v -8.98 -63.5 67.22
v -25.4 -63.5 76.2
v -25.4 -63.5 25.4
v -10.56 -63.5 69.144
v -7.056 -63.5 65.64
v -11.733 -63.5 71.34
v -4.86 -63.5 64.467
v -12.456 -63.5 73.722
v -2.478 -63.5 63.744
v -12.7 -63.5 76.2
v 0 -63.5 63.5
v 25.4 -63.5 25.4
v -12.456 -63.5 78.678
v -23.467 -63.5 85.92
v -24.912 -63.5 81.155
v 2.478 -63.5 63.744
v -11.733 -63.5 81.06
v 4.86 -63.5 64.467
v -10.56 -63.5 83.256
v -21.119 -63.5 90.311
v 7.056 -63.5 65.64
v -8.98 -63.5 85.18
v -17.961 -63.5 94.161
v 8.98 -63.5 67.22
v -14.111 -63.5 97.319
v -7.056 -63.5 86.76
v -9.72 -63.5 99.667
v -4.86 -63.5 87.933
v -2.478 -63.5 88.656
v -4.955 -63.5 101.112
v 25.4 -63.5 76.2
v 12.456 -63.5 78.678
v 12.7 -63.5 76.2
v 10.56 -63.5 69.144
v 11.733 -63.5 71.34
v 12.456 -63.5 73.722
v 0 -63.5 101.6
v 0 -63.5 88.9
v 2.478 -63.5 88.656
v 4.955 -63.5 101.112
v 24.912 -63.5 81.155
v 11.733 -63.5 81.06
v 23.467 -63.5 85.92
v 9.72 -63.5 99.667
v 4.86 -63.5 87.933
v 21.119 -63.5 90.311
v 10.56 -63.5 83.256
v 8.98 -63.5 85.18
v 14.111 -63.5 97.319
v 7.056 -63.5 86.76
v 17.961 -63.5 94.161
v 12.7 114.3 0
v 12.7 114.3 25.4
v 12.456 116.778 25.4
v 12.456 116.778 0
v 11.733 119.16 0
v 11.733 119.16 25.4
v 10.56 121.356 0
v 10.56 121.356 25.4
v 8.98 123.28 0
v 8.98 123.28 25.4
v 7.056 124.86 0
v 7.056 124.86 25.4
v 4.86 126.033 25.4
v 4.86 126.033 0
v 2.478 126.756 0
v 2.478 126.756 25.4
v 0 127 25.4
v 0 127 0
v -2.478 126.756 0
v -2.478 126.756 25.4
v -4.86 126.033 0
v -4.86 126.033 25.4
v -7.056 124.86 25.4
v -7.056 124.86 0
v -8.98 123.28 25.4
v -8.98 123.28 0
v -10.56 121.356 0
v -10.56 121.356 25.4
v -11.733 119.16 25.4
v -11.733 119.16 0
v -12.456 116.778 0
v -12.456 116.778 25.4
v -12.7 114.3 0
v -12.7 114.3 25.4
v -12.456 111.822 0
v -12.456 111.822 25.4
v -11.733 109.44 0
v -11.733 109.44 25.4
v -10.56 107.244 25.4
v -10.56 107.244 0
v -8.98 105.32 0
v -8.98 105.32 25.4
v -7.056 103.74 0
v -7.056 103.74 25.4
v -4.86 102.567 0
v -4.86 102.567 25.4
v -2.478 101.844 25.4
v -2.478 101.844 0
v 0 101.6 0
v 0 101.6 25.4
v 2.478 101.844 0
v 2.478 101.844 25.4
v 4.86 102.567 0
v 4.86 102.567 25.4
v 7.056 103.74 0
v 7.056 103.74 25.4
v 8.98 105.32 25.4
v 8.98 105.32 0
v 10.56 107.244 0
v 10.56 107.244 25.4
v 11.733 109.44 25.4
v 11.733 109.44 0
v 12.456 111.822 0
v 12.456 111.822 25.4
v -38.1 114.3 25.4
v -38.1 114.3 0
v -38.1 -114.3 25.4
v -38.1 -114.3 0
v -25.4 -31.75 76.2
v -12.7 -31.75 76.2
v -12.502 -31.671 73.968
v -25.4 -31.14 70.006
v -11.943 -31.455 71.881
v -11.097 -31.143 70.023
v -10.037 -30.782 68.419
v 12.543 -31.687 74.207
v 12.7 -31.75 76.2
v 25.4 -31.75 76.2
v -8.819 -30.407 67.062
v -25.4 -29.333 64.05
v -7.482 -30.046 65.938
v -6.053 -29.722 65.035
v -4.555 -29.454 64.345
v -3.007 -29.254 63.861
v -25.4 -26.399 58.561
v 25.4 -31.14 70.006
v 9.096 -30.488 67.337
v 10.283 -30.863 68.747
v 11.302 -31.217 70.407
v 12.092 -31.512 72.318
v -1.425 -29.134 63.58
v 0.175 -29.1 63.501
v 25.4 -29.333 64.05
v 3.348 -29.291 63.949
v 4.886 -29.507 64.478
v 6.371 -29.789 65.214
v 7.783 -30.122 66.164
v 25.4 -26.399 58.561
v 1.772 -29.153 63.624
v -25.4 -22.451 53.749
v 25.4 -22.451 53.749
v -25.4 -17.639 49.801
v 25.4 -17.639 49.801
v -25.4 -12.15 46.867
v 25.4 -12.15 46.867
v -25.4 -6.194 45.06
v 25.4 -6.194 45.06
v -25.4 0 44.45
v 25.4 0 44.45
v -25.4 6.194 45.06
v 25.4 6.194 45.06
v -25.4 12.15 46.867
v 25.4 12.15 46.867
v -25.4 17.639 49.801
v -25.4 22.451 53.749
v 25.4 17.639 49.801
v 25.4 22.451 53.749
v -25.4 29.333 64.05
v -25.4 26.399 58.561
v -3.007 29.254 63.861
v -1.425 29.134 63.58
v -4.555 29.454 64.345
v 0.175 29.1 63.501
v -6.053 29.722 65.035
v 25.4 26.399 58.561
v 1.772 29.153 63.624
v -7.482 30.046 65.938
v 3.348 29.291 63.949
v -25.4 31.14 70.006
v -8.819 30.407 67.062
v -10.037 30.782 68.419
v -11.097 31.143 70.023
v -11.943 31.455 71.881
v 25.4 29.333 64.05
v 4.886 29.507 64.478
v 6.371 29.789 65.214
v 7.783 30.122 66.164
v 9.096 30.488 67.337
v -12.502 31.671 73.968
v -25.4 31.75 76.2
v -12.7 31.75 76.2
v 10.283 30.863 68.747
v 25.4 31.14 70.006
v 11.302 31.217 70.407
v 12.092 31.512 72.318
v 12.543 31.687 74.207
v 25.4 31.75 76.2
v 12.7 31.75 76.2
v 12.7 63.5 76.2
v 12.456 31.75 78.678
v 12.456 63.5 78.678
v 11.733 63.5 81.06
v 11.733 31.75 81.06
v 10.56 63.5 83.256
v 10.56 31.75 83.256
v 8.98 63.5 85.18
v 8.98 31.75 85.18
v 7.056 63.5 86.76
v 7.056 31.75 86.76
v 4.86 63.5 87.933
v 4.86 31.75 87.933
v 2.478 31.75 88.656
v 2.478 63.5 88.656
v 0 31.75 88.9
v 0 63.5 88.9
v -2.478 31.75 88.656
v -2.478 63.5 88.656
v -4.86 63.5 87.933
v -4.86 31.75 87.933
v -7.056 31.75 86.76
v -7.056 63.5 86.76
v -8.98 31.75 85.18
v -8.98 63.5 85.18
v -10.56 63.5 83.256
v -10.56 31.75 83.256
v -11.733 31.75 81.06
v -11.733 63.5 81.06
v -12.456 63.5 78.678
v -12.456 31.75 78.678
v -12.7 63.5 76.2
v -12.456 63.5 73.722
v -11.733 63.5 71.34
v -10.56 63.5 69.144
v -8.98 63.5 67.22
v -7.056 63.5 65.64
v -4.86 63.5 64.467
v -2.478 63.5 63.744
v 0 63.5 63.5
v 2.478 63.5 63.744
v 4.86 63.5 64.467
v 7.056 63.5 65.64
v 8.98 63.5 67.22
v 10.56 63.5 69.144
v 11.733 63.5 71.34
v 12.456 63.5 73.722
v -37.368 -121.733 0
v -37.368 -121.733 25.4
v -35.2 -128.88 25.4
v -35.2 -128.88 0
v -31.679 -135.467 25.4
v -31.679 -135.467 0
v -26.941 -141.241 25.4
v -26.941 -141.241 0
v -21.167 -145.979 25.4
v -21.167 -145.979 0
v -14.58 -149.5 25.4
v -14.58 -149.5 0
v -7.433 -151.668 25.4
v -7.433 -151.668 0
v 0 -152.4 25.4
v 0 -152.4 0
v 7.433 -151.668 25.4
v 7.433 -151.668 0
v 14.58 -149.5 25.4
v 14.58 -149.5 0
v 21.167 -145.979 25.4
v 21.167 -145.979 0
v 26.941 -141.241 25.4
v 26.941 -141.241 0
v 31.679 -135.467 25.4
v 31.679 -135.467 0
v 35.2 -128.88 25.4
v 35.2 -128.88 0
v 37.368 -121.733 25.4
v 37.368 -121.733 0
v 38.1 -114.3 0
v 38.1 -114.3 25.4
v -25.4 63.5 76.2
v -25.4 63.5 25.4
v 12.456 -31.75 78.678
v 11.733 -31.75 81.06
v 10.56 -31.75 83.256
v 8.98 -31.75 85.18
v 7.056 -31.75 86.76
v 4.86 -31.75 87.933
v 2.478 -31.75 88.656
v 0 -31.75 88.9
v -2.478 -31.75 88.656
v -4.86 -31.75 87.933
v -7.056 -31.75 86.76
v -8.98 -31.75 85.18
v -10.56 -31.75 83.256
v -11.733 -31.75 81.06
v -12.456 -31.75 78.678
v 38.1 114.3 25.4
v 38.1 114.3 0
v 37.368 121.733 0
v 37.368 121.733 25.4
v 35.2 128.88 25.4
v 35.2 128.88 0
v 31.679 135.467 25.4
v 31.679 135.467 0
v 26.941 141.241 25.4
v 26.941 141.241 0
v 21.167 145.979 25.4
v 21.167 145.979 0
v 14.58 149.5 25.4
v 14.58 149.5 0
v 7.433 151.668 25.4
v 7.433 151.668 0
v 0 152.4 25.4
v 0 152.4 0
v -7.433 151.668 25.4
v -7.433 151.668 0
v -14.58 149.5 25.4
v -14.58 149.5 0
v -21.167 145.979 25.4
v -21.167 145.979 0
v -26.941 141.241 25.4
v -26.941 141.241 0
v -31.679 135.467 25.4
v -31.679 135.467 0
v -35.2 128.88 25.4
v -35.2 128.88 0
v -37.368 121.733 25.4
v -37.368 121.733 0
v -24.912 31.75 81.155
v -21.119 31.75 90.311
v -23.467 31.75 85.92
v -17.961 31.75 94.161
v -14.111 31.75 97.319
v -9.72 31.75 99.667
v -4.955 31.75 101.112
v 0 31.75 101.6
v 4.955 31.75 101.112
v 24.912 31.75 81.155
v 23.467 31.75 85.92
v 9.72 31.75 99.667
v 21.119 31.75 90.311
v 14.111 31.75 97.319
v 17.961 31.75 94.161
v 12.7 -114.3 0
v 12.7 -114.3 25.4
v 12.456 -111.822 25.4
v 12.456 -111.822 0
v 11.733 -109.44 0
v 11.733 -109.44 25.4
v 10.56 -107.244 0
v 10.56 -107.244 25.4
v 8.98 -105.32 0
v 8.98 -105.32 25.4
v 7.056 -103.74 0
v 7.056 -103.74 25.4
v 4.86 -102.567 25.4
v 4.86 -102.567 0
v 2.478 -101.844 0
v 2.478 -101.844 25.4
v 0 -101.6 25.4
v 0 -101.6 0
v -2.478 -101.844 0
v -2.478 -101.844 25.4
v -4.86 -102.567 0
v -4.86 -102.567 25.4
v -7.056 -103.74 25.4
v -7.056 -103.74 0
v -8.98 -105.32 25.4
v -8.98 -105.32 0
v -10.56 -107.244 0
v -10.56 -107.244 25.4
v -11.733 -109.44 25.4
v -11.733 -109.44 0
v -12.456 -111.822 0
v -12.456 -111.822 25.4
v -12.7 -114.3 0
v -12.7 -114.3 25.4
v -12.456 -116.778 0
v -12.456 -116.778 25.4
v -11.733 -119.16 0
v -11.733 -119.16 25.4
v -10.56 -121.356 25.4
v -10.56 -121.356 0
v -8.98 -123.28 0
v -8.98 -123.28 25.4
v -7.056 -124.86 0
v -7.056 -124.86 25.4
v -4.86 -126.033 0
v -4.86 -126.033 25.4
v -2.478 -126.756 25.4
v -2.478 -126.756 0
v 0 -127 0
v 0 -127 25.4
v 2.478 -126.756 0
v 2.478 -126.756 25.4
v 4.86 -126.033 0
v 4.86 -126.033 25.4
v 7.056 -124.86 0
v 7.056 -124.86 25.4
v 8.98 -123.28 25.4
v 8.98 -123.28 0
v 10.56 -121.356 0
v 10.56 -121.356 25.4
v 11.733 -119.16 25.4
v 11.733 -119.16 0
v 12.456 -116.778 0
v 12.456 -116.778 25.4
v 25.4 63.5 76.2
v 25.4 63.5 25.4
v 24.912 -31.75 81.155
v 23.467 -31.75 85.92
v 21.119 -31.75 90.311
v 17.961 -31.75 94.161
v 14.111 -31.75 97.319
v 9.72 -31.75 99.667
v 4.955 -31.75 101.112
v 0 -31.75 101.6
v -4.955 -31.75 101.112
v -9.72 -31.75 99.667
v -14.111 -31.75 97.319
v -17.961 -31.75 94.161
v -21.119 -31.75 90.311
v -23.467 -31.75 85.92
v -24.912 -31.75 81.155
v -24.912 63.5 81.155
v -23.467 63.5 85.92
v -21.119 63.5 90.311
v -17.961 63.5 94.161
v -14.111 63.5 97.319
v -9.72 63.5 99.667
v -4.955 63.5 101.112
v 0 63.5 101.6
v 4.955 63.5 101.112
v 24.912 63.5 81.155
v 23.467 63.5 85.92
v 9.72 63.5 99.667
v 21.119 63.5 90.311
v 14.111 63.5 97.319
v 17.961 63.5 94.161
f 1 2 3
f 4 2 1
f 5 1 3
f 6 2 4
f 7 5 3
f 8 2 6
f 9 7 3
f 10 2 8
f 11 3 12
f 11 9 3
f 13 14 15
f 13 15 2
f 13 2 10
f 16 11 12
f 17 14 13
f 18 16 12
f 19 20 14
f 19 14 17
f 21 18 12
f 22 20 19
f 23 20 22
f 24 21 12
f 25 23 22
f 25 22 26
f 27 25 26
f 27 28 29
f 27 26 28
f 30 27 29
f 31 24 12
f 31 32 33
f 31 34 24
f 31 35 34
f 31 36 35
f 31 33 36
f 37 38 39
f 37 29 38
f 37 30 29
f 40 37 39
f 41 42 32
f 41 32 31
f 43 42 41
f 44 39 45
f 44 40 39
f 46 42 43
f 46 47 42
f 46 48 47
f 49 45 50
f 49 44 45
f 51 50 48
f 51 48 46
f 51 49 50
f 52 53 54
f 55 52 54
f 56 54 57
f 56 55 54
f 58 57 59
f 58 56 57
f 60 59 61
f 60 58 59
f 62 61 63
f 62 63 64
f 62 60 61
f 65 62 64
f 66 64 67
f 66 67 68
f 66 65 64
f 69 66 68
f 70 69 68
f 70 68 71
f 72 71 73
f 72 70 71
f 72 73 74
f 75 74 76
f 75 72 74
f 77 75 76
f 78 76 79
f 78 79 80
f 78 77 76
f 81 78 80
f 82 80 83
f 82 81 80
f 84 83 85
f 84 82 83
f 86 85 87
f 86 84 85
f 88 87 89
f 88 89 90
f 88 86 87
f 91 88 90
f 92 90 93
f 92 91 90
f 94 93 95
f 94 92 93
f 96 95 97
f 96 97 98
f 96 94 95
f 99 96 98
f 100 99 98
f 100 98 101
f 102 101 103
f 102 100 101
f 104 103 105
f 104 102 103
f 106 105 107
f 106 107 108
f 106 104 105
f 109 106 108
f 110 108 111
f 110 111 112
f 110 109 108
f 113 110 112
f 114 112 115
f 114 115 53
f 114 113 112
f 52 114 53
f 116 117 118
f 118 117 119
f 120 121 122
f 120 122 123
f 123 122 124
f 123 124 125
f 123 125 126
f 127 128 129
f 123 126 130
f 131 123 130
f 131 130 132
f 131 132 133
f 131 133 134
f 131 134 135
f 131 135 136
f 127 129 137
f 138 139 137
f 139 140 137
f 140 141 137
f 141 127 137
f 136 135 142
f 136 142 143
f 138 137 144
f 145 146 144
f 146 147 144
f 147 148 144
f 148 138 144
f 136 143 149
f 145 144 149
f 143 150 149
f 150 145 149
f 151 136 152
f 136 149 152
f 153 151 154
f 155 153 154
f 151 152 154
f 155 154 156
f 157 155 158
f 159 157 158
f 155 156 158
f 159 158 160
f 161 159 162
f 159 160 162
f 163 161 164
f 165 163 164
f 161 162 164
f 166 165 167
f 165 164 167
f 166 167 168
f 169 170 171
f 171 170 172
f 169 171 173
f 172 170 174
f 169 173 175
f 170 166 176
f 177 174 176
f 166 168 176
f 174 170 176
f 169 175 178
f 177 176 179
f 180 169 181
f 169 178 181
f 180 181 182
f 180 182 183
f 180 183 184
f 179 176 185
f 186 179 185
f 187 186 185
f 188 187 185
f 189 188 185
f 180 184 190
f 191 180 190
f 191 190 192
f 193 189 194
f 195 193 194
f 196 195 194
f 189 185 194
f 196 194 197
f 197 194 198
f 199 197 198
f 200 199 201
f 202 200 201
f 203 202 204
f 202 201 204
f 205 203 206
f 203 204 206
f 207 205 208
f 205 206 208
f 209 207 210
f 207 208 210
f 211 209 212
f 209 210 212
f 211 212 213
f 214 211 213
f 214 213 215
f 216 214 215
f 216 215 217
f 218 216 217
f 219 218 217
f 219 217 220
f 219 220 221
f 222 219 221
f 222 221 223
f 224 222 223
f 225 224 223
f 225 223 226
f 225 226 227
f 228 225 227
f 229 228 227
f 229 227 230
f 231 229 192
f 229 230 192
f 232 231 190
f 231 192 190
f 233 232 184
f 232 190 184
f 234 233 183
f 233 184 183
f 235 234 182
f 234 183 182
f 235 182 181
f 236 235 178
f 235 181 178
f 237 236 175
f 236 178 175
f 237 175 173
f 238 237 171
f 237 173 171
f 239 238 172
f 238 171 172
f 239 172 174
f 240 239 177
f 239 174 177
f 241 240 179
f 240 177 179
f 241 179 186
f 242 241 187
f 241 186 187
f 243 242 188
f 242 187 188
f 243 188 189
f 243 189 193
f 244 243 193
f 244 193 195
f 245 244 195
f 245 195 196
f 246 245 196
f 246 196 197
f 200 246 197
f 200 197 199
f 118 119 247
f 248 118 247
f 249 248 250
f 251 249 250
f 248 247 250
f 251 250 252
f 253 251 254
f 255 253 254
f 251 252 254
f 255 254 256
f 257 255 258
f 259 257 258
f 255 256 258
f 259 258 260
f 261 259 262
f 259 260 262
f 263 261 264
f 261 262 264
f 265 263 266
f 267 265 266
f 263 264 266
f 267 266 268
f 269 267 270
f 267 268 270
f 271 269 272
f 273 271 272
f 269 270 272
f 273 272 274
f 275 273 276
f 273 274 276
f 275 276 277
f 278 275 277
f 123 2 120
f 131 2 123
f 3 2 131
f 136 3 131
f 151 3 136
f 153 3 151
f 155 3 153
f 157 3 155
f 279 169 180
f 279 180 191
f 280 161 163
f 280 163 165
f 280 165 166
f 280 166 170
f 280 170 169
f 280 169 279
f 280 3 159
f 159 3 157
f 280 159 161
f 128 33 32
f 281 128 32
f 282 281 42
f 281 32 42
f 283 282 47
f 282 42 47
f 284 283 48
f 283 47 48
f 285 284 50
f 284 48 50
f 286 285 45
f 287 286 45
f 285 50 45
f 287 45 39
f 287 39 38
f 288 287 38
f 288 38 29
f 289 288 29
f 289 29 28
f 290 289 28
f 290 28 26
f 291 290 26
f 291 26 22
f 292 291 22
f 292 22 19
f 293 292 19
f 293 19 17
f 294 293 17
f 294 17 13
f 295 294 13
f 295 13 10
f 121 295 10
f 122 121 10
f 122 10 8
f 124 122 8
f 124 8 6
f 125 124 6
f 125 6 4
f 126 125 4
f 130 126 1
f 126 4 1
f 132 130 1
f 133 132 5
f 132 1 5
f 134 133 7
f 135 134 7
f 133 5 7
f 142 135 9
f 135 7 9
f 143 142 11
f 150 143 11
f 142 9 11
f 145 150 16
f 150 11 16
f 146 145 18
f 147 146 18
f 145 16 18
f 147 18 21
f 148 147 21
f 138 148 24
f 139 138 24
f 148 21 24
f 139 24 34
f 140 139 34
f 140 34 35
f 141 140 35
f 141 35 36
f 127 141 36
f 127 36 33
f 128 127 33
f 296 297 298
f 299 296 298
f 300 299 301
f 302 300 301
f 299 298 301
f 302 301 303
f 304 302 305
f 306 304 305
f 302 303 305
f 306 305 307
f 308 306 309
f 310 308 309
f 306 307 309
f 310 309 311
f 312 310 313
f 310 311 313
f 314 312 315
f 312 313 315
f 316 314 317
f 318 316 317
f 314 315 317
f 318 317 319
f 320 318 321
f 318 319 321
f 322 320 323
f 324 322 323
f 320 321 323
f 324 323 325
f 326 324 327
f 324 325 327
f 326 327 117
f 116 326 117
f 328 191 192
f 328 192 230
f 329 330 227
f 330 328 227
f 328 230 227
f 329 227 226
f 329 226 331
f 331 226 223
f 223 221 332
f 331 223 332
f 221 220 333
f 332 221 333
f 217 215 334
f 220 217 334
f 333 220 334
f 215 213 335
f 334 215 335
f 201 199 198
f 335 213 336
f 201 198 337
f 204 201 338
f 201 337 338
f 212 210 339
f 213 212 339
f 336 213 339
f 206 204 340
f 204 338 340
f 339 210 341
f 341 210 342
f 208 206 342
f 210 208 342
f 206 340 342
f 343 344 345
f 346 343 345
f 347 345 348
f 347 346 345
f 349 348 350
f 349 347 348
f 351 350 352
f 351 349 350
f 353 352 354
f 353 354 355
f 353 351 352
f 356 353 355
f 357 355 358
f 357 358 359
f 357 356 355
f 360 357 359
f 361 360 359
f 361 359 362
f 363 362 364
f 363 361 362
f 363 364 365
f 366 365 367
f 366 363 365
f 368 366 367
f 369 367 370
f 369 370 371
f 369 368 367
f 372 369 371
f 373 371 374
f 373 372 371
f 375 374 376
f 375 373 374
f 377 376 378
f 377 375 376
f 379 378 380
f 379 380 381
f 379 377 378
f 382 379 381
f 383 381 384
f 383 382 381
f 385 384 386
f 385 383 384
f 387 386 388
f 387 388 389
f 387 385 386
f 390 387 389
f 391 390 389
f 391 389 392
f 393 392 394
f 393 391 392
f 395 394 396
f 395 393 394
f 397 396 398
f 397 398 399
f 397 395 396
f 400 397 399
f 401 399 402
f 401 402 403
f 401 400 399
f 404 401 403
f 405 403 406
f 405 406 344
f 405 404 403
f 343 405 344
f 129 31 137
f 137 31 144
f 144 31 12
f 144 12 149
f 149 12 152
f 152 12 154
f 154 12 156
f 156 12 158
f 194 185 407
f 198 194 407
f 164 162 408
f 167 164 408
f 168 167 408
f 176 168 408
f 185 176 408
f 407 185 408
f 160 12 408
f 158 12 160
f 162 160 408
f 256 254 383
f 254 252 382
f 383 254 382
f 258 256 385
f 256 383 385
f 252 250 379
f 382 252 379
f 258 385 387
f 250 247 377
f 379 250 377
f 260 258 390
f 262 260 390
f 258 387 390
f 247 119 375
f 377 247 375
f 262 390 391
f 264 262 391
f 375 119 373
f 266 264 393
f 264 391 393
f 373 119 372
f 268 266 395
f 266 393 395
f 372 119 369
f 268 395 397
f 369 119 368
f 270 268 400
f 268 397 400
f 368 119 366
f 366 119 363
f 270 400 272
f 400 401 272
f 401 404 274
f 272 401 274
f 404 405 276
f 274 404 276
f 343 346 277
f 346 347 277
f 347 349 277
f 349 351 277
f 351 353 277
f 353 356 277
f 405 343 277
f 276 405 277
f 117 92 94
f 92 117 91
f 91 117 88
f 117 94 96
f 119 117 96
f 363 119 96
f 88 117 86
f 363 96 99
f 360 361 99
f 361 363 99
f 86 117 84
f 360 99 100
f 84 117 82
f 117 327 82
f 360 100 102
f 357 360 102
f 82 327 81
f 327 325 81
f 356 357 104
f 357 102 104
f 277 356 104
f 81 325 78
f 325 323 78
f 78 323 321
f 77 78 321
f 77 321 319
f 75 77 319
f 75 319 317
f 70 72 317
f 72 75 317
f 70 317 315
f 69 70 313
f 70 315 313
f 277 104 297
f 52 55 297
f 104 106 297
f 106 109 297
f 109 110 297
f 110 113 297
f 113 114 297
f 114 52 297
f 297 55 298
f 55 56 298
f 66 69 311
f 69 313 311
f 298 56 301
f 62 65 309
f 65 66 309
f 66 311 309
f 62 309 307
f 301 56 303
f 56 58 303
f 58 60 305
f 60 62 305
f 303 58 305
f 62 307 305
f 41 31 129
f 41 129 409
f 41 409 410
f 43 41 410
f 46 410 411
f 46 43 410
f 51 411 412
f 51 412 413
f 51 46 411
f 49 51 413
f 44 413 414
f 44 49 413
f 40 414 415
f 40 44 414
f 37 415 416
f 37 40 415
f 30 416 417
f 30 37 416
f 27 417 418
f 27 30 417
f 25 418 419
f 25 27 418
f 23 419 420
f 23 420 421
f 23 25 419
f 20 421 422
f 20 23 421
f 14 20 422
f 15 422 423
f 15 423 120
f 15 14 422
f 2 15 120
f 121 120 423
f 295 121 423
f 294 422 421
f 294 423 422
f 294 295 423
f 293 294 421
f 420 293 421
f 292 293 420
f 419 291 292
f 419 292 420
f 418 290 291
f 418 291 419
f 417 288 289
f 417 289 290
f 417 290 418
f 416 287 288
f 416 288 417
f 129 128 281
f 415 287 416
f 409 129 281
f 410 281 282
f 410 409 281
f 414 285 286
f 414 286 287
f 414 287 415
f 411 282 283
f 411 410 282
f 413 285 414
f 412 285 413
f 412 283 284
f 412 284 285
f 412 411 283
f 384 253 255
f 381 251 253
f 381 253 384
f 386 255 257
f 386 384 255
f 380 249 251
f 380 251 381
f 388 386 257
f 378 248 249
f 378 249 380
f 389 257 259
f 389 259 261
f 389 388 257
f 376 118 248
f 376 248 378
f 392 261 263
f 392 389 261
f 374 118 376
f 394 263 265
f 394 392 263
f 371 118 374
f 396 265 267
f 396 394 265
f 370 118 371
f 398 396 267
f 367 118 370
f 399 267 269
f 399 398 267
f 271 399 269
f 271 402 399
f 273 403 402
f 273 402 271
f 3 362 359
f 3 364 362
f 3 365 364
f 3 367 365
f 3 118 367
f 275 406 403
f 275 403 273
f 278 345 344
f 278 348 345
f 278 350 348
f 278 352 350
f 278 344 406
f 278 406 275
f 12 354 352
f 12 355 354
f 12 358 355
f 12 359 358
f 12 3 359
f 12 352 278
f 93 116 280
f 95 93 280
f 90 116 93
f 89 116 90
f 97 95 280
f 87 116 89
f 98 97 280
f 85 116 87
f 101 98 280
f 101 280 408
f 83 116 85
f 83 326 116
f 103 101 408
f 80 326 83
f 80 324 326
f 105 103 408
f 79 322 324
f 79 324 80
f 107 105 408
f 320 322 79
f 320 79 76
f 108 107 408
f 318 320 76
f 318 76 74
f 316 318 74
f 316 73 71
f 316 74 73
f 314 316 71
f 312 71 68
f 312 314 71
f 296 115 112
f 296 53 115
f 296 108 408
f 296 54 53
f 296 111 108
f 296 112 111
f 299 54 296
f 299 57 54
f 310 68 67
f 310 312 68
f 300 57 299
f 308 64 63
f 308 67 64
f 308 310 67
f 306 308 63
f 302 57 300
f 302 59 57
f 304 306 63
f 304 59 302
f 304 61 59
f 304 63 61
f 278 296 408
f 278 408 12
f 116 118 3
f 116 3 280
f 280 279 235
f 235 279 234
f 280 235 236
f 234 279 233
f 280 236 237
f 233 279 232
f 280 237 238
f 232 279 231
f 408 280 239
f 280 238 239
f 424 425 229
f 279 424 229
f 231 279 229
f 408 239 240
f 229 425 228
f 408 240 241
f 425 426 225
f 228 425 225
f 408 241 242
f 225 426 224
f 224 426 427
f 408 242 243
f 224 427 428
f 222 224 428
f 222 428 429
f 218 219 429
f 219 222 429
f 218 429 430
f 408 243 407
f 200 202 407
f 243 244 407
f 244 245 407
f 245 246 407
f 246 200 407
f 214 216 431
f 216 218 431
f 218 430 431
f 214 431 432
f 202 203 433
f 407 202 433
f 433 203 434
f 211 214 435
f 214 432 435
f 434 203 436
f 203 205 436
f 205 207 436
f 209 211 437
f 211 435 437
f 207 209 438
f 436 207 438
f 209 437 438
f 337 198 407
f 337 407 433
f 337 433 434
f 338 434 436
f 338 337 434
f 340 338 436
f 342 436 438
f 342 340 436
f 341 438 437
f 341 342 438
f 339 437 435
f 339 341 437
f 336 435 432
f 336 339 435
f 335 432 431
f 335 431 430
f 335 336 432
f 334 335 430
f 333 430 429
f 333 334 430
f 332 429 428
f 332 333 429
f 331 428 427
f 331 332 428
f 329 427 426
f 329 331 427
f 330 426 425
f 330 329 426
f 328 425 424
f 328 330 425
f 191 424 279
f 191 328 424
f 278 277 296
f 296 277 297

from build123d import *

# Parameters (mm, degrees)
F0_R     = 12.7
F1_DEPTH = 25.4
F2_W     = 50.8
F2_H     = 127
F3_DEPTH = 50.8
F5_DEPTH = 127
F6_R     = 12.7
F7_DEPTH = 127
F8_W     = 63.5
F8_H     = 63.5
F9_DEPTH = 76.2


with BuildPart() as f1:
    # F0 (on Top) → F1 (new body)
    with BuildSketch(Plane.XY):
        with BuildLine():
            ThreePointArc((-38.1, -114.3), (0, -152.4), (38.1, -114.3))
            Line((38.1, -114.3), (38.1, 114.3))
            ThreePointArc((38.1, 114.3), (0, 152.4), (-38.1, 114.3))
            Line((-38.1, 114.3), (-38.1, -114.3))
        make_face()
        with Locations((0, -114.3)):
            Circle(F0_R, mode=Mode.SUBTRACT)
        with Locations((0, 114.3)):
            Circle(F0_R, mode=Mode.SUBTRACT)
    extrude(amount=F1_DEPTH)

    # F2 (on face) → F3 (join)
    with BuildSketch(Plane.XY.offset(25.4)):
        Rectangle(F2_W, F2_H)
    extrude(amount=F3_DEPTH)

    # F4 (on face) → F5 (join)
    with BuildSketch(Plane.XZ.offset(63.5)):
        with BuildLine():
            Line((-25.4, 76.2), (25.4, 76.2))
            ThreePointArc((25.4, 76.2), (0, 101.6), (-25.4, 76.2))
        make_face()
    extrude(amount=-F5_DEPTH)

    # F6 (on face) → F7 (cut)
    with BuildSketch(Plane.XZ.offset(63.5)):
        with Locations((0, 76.2)):
            Circle(F6_R)
    extrude(amount=-F7_DEPTH, mode=Mode.SUBTRACT)

    # F8 (on face) → F9 (cut)
    with BuildSketch(Plane.YZ.offset(25.4)):
        with BuildLine():
            Line((31.75, 76.2), (-31.75, 76.2))
            ThreePointArc((-31.75, 76.2), (0, 44.45), (31.75, 76.2))
        make_face()
        with Locations((0, 107.95)):
            Rectangle(F8_W, F8_H)
    extrude(amount=-F9_DEPTH, mode=Mode.SUBTRACT)


solid = f1.part
